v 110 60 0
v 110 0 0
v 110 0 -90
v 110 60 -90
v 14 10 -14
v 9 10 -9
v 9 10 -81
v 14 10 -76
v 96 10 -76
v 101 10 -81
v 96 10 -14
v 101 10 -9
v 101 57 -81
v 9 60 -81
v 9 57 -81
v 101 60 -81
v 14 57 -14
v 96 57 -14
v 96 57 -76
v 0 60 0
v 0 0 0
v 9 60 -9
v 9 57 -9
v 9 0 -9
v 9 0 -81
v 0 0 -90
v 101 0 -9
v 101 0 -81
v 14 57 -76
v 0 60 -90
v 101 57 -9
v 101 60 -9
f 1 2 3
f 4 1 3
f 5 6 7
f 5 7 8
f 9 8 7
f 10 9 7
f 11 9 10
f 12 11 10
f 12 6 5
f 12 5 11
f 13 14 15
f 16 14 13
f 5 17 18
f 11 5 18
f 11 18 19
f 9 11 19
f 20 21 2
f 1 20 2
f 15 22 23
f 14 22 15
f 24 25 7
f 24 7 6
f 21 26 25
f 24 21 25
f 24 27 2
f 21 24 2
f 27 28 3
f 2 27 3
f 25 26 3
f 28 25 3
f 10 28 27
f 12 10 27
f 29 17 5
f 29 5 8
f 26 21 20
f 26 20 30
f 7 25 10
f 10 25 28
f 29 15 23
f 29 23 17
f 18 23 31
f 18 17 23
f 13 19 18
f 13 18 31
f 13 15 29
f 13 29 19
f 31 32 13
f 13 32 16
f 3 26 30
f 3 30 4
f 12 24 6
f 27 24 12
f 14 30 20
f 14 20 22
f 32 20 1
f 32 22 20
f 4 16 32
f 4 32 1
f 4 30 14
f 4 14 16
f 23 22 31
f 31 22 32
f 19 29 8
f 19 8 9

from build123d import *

# Parameters (mm, degrees)
SKETCH2_W           = 110
SKETCH2_H           = 90
BOSS_EXTRUDE2_DEPTH = 60
SKETCH5_W           = 92
SKETCH5_H           = 72
CUT_EXTRUDE3_DEPTH  = 3
SKETCH6_W           = 92
SKETCH6_H           = 72
CUT_EXTRUDE4_DEPTH  = 10
SKETCH7_W           = 82
SKETCH7_H           = 62
CUT_EXTRUDE5_DEPTH  = 60


with BuildPart() as part:
    # Sketch2 → Boss-Extrude2 (new body)
    with BuildSketch(Plane(origin=(0, 0, 0), x_dir=(1, 0, 0), z_dir=(0, 1, 0))):
        with Locations((55, 45)):
            Rectangle(SKETCH2_W, SKETCH2_H)
    extrude(amount=BOSS_EXTRUDE2_DEPTH)

    # Sketch5 → Cut-Extrude3 (cut)
    with BuildSketch(Plane(origin=(0, 60, 0), x_dir=(1, 0, 0), z_dir=(0, 1, 0))):
        with Locations((55, 45)):
            Rectangle(SKETCH5_W, SKETCH5_H)
    extrude(amount=-CUT_EXTRUDE3_DEPTH, mode=Mode.SUBTRACT)

    # Sketch6 → Cut-Extrude4 (cut)
    with BuildSketch(Plane.XZ):
        with Locations((55, -45)):
            Rectangle(SKETCH6_W, SKETCH6_H)
    extrude(amount=-CUT_EXTRUDE4_DEPTH, mode=Mode.SUBTRACT)

    # Sketch7 → Cut-Extrude5 (cut)
    with BuildSketch(Plane(origin=(0, 57, 0), x_dir=(1, 0, 0), z_dir=(0, 1, 0))):
        with Locations((55, 45)):
            Rectangle(SKETCH7_W, SKETCH7_H)
    extrude(amount=-CUT_EXTRUDE5_DEPTH, mode=Mode.SUBTRACT)


solid = part.part
